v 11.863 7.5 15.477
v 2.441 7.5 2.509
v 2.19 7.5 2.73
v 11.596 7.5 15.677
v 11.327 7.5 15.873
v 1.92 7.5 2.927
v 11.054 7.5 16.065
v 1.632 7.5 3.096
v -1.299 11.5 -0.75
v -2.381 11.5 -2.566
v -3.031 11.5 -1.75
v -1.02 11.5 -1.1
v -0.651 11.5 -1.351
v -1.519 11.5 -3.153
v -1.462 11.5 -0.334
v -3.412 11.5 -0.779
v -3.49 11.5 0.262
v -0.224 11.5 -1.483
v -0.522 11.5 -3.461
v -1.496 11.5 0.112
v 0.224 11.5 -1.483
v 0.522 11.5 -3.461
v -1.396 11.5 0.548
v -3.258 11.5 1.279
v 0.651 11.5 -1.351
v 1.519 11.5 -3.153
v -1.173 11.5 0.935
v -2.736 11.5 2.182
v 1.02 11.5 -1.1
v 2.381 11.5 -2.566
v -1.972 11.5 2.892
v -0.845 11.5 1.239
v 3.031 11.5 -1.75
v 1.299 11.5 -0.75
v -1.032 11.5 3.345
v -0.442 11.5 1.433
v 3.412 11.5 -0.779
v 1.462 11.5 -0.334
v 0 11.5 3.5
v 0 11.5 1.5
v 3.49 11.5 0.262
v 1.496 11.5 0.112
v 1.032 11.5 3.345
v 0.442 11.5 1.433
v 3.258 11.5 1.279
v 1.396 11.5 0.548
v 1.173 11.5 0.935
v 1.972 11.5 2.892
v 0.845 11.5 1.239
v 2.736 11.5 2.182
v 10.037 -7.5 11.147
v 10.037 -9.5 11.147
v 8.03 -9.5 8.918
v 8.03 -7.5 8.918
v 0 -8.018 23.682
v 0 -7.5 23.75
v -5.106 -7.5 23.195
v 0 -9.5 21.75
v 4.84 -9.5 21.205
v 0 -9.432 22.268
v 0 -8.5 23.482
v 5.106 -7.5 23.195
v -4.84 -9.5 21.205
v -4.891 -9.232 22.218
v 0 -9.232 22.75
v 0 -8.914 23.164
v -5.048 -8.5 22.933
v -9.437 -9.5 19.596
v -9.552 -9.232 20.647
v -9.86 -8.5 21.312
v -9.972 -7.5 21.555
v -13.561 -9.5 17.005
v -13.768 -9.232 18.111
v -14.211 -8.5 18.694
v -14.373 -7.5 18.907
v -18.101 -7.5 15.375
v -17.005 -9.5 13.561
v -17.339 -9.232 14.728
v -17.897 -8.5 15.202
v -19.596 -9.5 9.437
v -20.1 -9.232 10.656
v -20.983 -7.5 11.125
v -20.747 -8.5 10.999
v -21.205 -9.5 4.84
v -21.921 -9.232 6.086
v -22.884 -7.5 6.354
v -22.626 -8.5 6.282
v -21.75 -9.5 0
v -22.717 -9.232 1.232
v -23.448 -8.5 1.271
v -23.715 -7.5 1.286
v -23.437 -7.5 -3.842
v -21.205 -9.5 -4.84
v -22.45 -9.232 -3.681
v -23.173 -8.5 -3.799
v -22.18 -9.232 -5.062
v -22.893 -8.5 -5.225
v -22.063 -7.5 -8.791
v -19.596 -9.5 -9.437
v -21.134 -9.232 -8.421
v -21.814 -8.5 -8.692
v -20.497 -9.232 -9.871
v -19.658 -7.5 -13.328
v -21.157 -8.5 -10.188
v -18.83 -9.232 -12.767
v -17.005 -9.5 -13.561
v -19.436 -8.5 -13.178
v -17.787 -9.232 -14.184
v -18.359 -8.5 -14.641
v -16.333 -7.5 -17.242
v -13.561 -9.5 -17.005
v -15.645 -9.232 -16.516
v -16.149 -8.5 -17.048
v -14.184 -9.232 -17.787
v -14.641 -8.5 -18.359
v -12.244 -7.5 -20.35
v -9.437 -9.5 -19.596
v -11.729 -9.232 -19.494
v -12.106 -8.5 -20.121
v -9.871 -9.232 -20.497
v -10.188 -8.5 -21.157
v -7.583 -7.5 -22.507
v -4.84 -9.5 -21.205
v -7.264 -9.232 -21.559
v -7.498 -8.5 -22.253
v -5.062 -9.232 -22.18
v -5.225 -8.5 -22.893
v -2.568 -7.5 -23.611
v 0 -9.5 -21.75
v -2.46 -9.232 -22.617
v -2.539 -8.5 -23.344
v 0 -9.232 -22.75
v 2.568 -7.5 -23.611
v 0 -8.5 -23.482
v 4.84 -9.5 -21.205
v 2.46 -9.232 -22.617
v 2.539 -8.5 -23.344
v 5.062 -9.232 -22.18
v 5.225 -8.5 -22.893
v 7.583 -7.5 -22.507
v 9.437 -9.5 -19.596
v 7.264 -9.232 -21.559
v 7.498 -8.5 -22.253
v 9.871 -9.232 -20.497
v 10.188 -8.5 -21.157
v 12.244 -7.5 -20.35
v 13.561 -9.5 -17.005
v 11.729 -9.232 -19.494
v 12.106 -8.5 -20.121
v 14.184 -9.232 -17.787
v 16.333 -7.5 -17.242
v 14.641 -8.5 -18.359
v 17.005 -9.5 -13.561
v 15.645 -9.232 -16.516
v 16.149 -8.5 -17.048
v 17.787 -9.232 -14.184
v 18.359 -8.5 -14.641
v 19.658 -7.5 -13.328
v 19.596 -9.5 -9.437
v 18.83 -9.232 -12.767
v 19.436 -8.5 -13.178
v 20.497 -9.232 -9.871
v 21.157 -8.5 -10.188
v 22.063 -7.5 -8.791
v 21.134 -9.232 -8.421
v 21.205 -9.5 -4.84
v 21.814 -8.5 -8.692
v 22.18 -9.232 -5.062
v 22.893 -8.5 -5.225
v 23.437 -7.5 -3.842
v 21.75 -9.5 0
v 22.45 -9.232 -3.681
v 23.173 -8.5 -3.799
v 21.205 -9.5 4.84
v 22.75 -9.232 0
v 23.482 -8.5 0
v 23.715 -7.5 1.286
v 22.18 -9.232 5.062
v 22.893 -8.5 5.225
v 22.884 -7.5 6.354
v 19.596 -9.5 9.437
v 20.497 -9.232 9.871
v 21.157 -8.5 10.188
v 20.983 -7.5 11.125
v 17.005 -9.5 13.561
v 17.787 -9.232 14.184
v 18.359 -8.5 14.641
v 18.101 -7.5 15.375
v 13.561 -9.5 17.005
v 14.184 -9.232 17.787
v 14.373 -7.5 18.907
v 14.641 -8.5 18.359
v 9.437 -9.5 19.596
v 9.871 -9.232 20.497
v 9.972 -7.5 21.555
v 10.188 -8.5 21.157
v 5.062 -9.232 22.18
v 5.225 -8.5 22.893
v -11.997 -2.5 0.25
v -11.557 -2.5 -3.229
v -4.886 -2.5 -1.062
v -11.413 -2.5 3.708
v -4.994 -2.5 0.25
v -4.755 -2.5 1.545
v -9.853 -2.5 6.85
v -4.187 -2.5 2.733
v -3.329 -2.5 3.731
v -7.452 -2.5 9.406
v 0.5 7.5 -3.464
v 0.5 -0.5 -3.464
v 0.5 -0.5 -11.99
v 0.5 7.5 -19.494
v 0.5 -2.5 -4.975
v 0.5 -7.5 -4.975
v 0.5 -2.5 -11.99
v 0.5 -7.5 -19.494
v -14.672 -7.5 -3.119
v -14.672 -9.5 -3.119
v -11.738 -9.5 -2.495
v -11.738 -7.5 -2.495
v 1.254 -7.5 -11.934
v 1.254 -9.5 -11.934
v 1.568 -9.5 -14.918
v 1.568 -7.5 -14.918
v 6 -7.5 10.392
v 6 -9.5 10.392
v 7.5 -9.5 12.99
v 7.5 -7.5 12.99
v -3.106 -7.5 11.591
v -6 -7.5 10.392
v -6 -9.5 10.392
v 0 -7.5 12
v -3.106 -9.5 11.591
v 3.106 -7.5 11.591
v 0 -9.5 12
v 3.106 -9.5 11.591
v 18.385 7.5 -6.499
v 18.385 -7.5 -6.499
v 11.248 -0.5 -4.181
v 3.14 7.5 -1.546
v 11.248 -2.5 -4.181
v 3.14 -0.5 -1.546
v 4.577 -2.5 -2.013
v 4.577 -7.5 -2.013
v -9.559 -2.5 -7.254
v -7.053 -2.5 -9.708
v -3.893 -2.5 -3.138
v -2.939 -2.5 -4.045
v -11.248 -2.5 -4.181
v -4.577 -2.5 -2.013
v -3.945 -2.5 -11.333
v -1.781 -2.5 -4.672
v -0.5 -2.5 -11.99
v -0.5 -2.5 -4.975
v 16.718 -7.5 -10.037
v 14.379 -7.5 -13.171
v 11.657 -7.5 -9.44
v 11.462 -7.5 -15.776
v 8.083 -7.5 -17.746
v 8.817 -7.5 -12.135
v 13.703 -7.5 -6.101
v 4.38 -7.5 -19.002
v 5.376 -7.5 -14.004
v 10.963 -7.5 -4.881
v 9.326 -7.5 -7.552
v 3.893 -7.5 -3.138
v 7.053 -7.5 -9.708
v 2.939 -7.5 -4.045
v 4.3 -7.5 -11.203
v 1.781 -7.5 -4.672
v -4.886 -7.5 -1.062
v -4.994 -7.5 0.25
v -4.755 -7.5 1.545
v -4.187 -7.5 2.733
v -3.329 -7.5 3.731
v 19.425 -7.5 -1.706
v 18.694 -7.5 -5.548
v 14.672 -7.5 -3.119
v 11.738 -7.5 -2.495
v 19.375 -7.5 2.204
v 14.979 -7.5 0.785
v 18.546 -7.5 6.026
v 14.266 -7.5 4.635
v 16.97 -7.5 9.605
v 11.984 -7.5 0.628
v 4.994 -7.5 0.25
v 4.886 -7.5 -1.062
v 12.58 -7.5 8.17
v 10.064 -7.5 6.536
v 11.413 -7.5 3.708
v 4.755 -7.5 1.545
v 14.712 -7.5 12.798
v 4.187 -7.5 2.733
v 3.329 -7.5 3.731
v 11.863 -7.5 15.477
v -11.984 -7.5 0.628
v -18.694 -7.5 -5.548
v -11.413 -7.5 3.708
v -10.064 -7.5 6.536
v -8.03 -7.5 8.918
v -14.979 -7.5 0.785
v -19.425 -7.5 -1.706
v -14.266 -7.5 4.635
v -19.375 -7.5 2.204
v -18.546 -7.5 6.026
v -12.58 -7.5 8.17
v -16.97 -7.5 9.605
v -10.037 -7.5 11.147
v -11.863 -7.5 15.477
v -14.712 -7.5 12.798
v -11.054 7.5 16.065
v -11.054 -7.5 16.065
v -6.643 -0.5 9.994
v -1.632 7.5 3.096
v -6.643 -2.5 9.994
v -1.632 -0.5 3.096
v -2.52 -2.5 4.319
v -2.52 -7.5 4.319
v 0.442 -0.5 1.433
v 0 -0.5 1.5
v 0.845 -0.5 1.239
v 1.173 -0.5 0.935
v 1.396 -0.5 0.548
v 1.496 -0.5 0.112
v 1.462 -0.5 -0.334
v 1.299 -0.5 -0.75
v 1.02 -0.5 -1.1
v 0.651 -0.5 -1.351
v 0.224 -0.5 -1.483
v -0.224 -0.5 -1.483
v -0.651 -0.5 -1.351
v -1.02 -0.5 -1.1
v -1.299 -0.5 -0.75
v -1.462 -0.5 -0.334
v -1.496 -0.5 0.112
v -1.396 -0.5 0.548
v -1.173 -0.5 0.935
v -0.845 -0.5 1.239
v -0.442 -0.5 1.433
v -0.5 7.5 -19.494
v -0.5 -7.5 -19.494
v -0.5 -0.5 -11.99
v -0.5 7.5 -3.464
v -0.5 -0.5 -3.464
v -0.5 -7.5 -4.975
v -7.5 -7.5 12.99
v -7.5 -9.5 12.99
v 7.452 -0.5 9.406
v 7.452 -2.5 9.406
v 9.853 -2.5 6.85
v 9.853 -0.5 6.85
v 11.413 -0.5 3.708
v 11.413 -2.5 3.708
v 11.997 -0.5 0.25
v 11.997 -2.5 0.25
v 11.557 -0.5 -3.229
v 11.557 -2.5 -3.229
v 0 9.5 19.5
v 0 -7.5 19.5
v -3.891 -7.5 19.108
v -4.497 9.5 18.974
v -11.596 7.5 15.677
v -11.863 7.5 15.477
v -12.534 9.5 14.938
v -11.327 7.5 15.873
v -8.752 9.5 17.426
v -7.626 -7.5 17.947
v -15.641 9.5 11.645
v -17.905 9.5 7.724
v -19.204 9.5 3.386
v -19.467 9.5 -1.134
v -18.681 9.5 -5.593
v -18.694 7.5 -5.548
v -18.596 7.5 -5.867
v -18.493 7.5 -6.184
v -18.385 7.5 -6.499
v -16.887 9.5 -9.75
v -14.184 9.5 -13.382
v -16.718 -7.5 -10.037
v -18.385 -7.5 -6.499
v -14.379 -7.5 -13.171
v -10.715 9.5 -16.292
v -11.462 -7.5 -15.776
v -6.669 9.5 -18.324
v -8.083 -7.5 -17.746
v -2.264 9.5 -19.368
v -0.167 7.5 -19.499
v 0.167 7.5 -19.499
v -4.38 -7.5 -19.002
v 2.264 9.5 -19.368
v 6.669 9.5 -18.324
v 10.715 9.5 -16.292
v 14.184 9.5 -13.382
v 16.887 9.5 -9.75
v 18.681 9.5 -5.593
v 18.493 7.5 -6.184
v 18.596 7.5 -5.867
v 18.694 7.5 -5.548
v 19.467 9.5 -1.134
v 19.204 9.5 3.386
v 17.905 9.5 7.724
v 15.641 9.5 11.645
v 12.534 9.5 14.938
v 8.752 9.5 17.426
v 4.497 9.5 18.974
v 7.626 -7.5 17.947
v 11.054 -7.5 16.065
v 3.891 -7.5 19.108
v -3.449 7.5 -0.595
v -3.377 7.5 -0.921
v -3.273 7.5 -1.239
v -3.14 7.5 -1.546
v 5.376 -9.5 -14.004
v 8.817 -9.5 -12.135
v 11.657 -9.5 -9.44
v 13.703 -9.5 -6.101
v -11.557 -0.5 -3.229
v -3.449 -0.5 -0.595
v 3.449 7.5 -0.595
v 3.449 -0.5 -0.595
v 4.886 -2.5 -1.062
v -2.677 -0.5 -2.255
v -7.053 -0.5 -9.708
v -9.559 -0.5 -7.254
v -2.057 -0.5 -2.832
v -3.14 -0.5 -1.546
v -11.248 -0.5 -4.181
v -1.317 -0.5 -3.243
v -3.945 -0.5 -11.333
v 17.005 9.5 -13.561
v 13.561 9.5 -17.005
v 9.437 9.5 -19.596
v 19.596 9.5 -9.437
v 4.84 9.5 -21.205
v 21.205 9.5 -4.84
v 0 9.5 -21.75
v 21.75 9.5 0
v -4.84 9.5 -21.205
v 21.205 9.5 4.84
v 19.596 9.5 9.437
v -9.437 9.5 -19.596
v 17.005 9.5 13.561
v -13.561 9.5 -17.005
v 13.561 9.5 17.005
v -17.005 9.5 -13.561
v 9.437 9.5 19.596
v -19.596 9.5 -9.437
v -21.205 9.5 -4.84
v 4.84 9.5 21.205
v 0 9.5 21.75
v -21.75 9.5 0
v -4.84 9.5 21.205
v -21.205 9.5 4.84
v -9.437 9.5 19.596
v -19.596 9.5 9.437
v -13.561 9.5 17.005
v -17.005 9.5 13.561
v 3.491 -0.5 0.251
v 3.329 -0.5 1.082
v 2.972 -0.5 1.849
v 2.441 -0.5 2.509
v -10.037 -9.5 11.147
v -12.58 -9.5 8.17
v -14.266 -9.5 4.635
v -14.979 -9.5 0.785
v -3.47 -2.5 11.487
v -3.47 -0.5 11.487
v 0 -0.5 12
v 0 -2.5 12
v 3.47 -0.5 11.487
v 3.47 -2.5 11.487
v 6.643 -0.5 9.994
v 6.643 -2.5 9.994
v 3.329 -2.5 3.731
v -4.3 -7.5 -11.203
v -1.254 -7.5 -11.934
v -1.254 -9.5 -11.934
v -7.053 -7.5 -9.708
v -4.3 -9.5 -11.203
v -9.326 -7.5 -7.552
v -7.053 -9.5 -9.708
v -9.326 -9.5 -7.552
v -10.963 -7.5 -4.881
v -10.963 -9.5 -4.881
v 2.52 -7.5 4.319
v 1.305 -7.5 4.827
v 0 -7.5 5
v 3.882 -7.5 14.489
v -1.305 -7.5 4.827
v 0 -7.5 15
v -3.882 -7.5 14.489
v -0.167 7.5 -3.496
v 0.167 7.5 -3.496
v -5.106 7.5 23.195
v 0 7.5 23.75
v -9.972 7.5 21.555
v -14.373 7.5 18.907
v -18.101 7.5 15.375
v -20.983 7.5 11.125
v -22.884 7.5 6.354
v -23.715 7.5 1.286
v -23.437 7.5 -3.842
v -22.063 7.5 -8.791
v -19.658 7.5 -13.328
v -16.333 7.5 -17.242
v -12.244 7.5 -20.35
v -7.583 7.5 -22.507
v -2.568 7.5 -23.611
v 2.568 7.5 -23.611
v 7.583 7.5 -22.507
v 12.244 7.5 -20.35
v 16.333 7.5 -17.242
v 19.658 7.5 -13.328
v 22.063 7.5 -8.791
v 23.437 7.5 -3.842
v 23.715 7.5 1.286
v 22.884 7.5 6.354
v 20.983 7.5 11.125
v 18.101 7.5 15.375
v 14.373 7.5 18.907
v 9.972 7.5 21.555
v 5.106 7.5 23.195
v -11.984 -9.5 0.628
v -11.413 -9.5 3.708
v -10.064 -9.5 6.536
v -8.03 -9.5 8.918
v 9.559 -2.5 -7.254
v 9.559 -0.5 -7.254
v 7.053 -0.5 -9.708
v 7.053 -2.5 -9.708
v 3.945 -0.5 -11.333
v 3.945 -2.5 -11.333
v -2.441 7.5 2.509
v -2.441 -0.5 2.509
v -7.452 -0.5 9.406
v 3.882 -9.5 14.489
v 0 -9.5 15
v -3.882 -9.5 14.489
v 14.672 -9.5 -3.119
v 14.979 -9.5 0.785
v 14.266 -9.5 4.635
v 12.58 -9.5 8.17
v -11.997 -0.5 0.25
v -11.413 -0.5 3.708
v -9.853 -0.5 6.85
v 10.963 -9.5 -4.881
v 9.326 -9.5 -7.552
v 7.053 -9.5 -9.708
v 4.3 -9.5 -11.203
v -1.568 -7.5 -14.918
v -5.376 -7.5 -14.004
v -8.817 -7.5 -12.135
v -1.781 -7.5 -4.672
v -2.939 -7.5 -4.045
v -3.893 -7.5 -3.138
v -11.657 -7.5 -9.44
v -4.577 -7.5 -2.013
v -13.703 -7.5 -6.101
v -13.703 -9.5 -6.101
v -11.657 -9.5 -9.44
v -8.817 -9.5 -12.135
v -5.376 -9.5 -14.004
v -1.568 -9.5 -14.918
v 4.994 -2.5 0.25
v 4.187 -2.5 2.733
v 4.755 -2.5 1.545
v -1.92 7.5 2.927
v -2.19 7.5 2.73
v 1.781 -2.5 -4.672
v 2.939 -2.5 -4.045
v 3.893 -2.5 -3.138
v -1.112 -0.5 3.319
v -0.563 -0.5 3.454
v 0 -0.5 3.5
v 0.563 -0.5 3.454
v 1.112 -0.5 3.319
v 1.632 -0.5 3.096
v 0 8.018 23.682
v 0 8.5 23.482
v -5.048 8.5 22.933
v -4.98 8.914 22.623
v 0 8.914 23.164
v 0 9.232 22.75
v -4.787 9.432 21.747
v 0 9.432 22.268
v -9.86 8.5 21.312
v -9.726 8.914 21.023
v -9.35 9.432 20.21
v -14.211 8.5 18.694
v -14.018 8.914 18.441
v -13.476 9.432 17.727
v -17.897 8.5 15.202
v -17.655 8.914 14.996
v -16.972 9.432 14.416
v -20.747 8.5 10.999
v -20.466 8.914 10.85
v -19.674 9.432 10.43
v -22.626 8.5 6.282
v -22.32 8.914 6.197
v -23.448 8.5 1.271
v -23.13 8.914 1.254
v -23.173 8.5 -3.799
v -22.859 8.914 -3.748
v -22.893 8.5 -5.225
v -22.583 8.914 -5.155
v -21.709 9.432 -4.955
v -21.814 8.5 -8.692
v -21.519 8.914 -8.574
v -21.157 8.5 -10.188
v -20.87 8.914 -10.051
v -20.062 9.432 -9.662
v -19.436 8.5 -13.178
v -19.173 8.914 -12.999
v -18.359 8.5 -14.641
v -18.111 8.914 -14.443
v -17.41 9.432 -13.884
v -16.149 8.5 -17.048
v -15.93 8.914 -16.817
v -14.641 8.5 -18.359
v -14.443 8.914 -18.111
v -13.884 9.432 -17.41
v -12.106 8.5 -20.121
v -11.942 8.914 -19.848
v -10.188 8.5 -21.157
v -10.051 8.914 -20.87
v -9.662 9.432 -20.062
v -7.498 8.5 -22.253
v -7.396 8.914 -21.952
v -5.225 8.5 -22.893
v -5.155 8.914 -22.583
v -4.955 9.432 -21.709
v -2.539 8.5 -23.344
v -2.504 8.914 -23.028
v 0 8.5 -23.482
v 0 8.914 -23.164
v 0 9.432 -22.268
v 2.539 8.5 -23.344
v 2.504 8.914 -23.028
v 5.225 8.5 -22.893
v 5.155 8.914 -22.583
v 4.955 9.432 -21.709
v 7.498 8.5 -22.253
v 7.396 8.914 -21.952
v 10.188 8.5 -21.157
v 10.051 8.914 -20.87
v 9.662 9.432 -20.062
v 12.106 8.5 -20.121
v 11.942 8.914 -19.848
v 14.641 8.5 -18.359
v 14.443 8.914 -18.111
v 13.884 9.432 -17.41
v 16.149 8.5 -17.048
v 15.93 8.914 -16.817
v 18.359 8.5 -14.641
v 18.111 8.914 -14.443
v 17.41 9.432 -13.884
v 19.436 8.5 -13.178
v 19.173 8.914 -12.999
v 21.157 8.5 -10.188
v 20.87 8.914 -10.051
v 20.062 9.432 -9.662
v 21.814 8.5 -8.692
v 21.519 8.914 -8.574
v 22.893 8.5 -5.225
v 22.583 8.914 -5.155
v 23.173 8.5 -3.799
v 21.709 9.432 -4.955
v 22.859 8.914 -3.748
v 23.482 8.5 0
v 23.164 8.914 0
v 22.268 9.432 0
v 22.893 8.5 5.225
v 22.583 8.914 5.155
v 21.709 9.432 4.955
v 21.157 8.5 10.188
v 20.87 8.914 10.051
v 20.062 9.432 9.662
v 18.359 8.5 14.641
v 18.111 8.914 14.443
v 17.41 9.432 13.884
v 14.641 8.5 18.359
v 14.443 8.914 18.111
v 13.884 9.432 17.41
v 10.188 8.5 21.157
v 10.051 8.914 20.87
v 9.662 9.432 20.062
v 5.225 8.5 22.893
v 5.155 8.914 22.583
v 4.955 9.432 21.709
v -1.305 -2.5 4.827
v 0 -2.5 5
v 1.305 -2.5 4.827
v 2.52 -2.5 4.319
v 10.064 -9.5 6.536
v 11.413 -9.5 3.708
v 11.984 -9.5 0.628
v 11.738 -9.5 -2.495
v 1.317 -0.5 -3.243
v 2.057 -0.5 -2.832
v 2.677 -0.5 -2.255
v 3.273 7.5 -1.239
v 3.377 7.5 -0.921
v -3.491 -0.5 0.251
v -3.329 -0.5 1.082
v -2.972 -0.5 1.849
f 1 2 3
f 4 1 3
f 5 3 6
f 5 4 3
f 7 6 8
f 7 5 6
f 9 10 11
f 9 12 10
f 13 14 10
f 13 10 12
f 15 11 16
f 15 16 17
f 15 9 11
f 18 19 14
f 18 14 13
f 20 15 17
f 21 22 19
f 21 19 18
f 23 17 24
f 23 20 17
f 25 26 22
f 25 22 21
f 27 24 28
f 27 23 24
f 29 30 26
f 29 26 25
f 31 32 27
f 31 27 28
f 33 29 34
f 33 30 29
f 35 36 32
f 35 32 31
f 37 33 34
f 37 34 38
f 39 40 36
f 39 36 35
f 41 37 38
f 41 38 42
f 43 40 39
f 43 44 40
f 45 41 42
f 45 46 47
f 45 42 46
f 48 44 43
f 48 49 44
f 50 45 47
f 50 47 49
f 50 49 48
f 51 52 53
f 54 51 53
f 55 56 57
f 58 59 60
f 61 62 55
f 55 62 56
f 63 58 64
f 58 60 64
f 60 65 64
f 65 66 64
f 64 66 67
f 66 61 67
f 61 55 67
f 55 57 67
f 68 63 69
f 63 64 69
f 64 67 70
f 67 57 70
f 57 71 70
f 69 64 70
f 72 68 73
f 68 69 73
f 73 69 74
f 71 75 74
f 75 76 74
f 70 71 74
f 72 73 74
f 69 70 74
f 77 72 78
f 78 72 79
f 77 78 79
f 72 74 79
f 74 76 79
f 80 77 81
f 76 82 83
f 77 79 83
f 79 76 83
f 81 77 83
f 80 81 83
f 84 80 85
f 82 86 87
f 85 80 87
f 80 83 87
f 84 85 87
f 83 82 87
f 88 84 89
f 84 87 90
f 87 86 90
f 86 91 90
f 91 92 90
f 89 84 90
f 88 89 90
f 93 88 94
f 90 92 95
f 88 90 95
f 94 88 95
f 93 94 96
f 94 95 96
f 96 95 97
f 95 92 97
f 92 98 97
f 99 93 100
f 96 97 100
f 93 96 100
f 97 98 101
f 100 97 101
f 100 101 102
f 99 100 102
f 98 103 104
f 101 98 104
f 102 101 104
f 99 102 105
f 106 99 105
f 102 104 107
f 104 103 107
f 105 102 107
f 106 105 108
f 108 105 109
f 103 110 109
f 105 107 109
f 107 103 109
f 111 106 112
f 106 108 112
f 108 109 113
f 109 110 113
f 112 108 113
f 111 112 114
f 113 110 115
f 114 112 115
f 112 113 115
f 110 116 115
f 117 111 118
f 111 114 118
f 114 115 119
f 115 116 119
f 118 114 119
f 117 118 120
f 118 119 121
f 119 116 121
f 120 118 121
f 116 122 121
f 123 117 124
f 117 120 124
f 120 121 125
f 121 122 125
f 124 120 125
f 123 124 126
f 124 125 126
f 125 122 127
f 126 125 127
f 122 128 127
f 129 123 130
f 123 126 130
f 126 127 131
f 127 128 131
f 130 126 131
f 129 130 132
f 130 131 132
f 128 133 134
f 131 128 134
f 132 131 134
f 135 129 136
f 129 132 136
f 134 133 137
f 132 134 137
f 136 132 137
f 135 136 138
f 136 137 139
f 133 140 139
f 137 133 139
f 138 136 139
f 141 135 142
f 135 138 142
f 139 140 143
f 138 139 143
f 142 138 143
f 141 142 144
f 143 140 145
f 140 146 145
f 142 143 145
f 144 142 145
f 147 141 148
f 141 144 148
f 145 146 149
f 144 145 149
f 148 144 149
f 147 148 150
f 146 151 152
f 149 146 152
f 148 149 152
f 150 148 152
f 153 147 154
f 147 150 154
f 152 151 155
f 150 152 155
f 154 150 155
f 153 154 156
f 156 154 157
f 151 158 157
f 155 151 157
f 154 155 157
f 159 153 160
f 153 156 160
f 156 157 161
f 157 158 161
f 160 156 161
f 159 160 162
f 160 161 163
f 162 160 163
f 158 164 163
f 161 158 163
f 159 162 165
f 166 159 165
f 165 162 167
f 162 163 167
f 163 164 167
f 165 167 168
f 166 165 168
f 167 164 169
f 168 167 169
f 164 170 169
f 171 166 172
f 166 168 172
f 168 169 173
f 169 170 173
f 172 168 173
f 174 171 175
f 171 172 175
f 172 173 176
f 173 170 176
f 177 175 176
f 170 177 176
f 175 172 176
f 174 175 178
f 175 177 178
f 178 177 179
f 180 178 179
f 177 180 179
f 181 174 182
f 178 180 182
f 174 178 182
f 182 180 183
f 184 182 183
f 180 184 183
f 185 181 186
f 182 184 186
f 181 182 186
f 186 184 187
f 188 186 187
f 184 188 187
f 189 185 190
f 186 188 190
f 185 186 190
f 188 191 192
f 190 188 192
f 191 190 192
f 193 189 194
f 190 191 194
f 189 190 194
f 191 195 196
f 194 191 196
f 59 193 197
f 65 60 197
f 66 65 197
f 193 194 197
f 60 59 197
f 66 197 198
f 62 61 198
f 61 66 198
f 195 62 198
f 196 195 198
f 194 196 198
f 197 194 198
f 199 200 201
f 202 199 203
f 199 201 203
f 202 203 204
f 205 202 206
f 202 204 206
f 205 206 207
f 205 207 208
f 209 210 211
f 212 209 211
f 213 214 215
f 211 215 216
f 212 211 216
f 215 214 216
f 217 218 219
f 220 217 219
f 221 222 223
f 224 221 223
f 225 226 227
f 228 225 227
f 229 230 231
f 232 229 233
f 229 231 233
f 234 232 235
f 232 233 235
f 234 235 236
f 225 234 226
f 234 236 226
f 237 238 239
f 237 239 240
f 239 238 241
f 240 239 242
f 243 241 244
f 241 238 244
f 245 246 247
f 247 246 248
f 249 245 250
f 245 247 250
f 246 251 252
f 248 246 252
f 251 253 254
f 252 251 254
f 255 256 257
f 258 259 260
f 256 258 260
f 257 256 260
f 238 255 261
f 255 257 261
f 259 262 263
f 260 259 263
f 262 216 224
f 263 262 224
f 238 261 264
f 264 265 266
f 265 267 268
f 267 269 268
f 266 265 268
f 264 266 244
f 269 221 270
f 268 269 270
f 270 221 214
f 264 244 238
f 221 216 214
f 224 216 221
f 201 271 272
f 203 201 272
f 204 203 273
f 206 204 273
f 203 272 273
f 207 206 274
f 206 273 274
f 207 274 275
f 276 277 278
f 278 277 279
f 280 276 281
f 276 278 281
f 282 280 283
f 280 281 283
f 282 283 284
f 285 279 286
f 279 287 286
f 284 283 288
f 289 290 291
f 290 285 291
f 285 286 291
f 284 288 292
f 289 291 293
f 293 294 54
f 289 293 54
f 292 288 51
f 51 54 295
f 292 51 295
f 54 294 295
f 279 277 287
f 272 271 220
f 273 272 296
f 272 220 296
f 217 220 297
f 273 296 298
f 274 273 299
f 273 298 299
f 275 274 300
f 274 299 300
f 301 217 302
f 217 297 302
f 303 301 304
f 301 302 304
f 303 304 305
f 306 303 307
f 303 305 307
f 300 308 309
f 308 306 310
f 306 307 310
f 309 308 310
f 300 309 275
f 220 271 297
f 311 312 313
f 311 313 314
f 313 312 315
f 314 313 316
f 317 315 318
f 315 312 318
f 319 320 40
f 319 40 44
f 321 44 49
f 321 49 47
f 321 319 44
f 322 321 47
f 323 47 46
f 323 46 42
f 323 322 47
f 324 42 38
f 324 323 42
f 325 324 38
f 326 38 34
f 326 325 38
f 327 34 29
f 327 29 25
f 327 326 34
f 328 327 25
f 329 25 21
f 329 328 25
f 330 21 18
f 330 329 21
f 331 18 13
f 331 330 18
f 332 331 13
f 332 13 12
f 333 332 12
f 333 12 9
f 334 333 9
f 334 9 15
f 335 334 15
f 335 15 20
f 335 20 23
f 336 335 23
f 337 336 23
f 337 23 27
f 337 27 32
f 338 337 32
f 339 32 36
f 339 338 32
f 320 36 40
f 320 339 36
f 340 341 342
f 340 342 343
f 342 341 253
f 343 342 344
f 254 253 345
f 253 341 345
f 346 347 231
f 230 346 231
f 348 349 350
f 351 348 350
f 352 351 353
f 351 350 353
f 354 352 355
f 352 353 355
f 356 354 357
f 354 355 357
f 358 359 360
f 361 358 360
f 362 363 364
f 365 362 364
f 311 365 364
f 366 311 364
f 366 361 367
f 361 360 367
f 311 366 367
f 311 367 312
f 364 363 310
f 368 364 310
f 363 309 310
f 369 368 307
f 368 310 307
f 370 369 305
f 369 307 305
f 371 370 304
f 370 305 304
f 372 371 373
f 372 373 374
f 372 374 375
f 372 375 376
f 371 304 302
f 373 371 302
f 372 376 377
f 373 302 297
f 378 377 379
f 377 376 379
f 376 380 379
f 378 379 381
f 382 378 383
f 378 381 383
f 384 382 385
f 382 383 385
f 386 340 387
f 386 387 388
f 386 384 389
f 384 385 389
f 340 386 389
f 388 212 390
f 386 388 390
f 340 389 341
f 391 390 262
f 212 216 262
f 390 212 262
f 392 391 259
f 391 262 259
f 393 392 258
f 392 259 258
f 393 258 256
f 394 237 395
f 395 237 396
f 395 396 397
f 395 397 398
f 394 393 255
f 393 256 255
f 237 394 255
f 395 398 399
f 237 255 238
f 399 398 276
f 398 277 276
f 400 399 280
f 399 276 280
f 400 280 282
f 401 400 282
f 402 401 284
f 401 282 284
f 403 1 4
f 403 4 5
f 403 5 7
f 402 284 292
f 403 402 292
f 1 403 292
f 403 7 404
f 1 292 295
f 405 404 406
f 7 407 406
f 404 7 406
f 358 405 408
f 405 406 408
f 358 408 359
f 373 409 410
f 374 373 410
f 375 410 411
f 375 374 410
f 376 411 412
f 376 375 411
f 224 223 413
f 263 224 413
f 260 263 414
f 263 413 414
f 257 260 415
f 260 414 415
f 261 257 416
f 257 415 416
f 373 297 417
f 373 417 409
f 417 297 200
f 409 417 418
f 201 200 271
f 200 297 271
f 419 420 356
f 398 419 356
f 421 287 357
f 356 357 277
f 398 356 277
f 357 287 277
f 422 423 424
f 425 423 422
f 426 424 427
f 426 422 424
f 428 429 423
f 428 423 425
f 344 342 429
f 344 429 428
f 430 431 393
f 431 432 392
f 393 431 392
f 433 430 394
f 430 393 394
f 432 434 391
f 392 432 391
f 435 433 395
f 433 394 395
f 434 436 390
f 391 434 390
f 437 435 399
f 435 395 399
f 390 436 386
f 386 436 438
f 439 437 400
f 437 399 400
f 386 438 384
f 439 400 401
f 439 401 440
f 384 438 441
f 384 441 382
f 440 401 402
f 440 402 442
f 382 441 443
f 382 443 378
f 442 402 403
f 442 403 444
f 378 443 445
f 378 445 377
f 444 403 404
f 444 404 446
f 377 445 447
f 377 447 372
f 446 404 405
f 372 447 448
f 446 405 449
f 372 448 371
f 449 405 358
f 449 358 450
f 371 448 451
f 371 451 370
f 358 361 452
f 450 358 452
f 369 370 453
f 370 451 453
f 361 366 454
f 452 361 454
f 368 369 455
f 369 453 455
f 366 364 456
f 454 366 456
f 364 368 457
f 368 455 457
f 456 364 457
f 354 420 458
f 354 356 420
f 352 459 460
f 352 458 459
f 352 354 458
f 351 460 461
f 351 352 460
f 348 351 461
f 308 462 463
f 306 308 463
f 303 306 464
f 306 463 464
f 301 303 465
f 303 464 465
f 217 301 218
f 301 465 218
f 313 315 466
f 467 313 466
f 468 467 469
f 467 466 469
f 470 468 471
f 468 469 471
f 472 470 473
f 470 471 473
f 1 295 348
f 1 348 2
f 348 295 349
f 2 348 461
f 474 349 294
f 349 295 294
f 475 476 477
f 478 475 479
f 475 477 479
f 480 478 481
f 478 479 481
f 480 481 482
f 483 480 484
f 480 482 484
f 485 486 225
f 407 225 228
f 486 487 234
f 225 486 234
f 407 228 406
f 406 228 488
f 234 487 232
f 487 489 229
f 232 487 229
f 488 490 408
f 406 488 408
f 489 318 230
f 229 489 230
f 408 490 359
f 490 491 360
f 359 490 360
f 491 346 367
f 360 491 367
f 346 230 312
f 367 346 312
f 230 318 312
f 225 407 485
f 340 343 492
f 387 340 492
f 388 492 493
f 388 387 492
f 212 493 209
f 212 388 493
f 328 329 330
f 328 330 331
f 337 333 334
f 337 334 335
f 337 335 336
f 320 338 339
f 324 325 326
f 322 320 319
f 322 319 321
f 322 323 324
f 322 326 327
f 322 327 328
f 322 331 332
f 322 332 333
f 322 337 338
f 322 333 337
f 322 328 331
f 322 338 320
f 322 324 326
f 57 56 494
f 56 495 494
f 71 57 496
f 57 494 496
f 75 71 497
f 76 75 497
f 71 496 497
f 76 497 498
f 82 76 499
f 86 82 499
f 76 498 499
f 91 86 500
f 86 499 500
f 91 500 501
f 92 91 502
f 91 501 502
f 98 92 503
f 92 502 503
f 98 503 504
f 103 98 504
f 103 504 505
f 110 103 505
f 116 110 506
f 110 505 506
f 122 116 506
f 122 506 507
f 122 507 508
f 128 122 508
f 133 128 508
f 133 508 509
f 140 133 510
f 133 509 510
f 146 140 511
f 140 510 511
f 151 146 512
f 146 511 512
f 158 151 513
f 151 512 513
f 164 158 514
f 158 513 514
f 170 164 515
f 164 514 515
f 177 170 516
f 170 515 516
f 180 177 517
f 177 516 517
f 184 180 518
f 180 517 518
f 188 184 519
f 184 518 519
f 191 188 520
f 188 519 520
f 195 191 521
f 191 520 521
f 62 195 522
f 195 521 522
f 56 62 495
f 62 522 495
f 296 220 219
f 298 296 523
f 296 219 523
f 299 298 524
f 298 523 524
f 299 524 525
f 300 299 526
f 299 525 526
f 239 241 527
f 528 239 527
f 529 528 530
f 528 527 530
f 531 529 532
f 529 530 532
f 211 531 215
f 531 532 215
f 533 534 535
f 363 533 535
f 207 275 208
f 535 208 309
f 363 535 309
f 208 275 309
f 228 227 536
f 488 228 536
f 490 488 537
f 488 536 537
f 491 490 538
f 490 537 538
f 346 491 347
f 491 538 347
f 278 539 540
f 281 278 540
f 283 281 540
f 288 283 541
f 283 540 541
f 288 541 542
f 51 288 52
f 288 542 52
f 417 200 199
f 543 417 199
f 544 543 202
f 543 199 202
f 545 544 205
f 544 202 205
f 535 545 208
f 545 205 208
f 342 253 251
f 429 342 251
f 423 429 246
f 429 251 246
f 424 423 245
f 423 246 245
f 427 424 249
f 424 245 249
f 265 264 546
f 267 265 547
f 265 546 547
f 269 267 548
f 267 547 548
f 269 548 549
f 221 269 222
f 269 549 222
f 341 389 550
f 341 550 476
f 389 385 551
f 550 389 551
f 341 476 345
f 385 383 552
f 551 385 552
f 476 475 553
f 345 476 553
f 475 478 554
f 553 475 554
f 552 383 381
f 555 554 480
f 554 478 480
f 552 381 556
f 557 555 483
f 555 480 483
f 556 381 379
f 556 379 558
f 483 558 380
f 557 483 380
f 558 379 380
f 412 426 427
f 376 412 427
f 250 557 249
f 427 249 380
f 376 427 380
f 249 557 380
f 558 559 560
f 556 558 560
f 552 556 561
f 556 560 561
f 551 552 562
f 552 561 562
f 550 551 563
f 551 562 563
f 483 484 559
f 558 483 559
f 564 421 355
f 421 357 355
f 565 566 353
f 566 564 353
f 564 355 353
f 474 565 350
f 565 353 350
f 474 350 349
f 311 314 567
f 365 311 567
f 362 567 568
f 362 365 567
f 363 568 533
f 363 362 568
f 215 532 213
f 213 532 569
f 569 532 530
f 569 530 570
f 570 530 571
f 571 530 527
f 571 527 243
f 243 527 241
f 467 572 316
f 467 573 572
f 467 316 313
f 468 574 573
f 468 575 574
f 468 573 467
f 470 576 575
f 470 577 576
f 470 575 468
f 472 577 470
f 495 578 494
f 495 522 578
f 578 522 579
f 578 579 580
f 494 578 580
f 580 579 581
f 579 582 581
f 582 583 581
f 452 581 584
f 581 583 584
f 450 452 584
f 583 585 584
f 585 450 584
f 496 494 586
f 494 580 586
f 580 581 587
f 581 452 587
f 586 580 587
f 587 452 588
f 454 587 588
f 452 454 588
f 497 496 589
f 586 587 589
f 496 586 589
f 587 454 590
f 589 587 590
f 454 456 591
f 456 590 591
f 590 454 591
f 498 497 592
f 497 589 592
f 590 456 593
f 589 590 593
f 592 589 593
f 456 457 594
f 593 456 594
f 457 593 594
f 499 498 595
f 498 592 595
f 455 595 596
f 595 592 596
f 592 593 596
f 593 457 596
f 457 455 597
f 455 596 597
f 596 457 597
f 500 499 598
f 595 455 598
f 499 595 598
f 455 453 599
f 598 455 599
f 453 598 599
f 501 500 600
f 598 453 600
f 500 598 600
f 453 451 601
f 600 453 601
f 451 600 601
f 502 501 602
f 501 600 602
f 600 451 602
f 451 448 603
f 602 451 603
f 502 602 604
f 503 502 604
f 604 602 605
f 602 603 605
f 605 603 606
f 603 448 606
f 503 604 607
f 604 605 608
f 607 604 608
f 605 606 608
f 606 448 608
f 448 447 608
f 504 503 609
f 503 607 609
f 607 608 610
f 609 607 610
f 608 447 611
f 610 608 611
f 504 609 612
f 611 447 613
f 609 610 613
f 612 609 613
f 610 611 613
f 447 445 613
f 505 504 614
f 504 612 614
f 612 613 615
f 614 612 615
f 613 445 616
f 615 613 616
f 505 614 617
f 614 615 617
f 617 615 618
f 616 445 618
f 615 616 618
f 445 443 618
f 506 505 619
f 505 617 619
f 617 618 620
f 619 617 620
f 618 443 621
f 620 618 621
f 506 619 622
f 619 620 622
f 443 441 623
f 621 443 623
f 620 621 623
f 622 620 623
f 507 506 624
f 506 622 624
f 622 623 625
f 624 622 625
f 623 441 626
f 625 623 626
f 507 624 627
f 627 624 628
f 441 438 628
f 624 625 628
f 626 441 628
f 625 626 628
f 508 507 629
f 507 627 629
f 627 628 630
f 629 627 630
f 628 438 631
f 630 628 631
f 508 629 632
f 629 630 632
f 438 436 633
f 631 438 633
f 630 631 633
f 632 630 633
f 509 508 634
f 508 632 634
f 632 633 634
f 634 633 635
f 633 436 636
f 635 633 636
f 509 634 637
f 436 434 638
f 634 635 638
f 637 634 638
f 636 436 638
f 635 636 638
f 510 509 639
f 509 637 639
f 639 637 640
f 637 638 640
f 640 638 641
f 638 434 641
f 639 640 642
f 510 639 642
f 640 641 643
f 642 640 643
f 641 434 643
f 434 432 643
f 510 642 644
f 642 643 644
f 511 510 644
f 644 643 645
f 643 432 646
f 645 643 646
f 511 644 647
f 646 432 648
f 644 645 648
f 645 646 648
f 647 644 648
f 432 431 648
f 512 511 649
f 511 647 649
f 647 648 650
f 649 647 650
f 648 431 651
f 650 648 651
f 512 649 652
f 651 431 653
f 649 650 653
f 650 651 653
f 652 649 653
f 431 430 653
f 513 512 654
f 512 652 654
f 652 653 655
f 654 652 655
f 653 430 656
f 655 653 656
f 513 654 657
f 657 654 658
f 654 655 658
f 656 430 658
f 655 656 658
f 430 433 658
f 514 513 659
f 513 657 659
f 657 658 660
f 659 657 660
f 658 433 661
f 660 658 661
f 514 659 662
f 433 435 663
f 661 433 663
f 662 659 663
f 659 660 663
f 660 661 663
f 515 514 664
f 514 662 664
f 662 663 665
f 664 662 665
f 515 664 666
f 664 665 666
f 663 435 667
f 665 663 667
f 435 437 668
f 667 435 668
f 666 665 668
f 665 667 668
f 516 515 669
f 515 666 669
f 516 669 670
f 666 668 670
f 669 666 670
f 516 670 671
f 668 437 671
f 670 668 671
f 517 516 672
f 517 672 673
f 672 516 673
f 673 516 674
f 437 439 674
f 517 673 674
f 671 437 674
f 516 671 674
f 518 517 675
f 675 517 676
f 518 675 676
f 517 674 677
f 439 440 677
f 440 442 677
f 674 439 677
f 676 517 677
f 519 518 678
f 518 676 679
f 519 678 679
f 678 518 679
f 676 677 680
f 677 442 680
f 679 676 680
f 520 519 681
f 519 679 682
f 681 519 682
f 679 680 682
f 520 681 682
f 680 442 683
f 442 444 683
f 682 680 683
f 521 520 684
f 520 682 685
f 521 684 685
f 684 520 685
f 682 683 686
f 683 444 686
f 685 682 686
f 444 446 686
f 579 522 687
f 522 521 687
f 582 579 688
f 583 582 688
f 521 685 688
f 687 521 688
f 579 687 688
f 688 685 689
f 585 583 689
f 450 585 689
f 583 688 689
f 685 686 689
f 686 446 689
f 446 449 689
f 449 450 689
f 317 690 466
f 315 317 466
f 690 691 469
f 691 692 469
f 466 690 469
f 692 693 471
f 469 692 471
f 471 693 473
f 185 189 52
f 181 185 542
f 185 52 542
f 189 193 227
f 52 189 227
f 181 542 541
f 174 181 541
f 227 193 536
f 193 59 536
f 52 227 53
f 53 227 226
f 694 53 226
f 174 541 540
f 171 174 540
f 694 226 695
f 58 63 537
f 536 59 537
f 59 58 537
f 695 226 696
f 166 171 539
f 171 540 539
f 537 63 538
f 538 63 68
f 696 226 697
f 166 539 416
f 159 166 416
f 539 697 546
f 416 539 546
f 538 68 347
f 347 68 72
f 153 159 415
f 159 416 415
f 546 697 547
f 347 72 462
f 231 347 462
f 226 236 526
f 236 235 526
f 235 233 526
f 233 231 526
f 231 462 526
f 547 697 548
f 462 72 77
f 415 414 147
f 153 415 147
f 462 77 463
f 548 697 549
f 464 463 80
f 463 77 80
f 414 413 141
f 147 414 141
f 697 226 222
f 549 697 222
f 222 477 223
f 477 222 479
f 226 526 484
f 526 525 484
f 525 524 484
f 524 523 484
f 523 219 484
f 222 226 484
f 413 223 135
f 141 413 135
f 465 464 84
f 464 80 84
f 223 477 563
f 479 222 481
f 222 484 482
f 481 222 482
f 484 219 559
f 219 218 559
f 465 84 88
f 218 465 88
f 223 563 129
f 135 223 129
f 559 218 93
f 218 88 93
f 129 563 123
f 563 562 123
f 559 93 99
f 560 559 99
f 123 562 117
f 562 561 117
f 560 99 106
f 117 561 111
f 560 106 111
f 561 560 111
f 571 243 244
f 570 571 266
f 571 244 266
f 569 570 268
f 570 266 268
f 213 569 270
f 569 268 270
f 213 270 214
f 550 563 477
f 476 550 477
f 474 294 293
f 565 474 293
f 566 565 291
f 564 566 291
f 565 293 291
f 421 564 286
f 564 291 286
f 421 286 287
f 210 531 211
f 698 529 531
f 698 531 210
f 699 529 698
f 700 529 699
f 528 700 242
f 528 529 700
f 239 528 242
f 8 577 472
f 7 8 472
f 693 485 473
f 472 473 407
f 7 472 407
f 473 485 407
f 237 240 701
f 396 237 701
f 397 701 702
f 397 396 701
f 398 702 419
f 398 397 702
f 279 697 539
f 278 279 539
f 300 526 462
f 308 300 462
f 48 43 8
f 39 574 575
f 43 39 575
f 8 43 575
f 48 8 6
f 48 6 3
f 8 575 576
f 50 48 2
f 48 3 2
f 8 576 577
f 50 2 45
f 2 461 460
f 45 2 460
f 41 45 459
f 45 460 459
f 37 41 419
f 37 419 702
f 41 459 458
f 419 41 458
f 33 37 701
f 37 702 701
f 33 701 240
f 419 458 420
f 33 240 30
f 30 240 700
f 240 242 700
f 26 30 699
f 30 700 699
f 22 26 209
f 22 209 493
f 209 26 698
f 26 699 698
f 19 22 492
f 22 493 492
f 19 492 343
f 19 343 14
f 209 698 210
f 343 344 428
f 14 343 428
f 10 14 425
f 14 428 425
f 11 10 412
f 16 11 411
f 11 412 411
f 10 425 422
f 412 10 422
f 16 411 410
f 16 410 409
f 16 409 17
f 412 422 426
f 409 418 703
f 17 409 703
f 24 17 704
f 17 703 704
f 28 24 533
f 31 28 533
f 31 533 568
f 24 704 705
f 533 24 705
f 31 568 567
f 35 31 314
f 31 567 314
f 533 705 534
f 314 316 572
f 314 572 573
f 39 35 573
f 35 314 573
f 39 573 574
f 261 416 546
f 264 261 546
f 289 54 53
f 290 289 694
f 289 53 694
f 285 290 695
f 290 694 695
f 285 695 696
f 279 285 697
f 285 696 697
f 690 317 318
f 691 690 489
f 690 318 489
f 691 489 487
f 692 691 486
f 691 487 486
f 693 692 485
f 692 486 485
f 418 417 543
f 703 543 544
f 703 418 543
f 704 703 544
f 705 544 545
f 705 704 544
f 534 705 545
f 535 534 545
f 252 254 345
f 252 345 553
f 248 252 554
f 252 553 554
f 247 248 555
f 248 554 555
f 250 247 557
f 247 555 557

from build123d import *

# Parameters (mm, degrees)
SKETCH_2_R               = 5
EXTRUDE_1_DEPTH          = 5
SKETCH_3_R               = 12
EXTRUDE_2_DEPTH          = 2
SKETCH_5_R               = 3.5
SKETCH_5_R_2             = 1.5
EXTRUDE_3_DEPTH          = 12
EXTRUDE_4_DEPTH          = 15
PATTERN_CIRCULAR_1_COUNT = 5
CUT_EXTRUDE_START        = -15
CUT_EXTRUDE_1_DEPTH      = 15
PATTERN_CIRCULAR_2_COUNT = 5


with BuildPart() as part:
    # 草图1 → 旋转1 (revolve)
    with BuildSketch(Plane.XY, mode=Mode.PRIVATE) as revolve_1_sk:
        with BuildLine():
            Line((19.5, 9.5), (19.5, -7.5))
            Line((19.5, -7.5), (0, -7.5))
            Line((0, -7.5), (0, -9.5))
            Line((0, -9.5), (21.75, -9.5))
            ThreePointArc((21.75, -9.5), (23.164213562, -8.914213562), (23.75, -7.5))
            Line((23.75, -7.5), (23.75, 7.5))
            ThreePointArc((23.75, 7.5), (23.164213562, 8.914213562), (21.75, 9.5))
            Line((21.75, 9.5), (19.5, 9.5))
        make_face()
    revolve(revolve_1_sk.sketch.rotate(Axis((0, 0, 0), (0, -1, 0)), 90), axis=Axis((0, 0, 0), (0, -1, 0)))

    # 草图2 → 凸台-拉伸1 (add)
    with BuildSketch(Plane(origin=(0, -7.5, 0), x_dir=(1, 0, 0), z_dir=(0, 1, 0))):
        with Locations(Location((0, 0, 0), (0, 0, 90))):
            Circle(SKETCH_2_R)
    extrude(amount=EXTRUDE_1_DEPTH)

    # 草图3 → 凸台-拉伸2 (add)
    with BuildSketch(Plane(origin=(0, -2.5, 0), x_dir=(1, 0, 0), z_dir=(0, 1, 0))):
        with Locations(Location((0, 0, 0), (0, 0, 270))):
            Circle(SKETCH_3_R)
    extrude(amount=EXTRUDE_2_DEPTH)

    # 草图5 → 凸台-拉伸3 (add)
    with BuildSketch(Plane(origin=(0, -0.5, 0), x_dir=(1, 0, 0), z_dir=(0, 1, 0))):
        with Locations(Location((0, 0, 0), (0, 0, 270))):
            Circle(SKETCH_5_R)
        with Locations(Location((0, 0, 0), (0, 0, 270))):
            Circle(SKETCH_5_R_2, mode=Mode.SUBTRACT)
    extrude(amount=EXTRUDE_3_DEPTH)

    # 草图6 → 凸台-拉伸4 (add)
    with BuildSketch(Plane(origin=(0, -7.5, 0), x_dir=(1, 0, 0), z_dir=(0, 1, 0))):
        with BuildLine():
            Line((-0.5, 19.49358869), (-0.5, 3.464101615))
            ThreePointArc((-0.5, 3.464101615), (0, 3.5), (0.5, 3.464101615))
            Line((0.5, 3.464101615), (0.5, 19.49358869))
            ThreePointArc((0.5, 19.49358869), (0, 19.5), (-0.5, 19.49358869))
        make_face()
    extrude_4 = extrude(amount=EXTRUDE_4_DEPTH)

    # 阵列(圆周)1: 凸台-拉伸4 ×5 about axis
    pattern_circular_1_axis = Axis((0, 0, 0), (0, 1, 0))
    for i in range(1, PATTERN_CIRCULAR_1_COUNT):
        add(extrude_4.rotate(pattern_circular_1_axis, i * 360 / PATTERN_CIRCULAR_1_COUNT))

    # 草图7 → 切除-拉伸1 (cut)
    with BuildSketch(Plane(origin=(0, -7.5, 0), x_dir=(1, 0, 0), z_dir=(0, 1, 0)).offset(CUT_EXTRUDE_START)):
        with BuildLine():
            Line((1.254341559, 11.934262744), (1.567926949, 14.917828431))
            ThreePointArc((1.567926949, 14.917828431), (8.816778784, 12.135254916), (13.703181865, 6.101049646))
            Line((13.703181865, 6.101049646), (10.962545492, 4.880839717))
            ThreePointArc((10.962545492, 4.880839717), (7.053423028, 9.708203932), (1.254341559, 11.934262744))
        make_face()
    cut_extrude_1 = extrude(amount=CUT_EXTRUDE_1_DEPTH, mode=Mode.SUBTRACT)

    # 阵列(圆周)2: 切除-拉伸1 ×5 about axis
    pattern_circular_2_axis = Axis((0, 0, 0), (0, 1, 0))
    for i in range(1, PATTERN_CIRCULAR_2_COUNT):
        add(cut_extrude_1.rotate(pattern_circular_2_axis, i * 360 / PATTERN_CIRCULAR_2_COUNT), mode=Mode.SUBTRACT)


solid = part.part
